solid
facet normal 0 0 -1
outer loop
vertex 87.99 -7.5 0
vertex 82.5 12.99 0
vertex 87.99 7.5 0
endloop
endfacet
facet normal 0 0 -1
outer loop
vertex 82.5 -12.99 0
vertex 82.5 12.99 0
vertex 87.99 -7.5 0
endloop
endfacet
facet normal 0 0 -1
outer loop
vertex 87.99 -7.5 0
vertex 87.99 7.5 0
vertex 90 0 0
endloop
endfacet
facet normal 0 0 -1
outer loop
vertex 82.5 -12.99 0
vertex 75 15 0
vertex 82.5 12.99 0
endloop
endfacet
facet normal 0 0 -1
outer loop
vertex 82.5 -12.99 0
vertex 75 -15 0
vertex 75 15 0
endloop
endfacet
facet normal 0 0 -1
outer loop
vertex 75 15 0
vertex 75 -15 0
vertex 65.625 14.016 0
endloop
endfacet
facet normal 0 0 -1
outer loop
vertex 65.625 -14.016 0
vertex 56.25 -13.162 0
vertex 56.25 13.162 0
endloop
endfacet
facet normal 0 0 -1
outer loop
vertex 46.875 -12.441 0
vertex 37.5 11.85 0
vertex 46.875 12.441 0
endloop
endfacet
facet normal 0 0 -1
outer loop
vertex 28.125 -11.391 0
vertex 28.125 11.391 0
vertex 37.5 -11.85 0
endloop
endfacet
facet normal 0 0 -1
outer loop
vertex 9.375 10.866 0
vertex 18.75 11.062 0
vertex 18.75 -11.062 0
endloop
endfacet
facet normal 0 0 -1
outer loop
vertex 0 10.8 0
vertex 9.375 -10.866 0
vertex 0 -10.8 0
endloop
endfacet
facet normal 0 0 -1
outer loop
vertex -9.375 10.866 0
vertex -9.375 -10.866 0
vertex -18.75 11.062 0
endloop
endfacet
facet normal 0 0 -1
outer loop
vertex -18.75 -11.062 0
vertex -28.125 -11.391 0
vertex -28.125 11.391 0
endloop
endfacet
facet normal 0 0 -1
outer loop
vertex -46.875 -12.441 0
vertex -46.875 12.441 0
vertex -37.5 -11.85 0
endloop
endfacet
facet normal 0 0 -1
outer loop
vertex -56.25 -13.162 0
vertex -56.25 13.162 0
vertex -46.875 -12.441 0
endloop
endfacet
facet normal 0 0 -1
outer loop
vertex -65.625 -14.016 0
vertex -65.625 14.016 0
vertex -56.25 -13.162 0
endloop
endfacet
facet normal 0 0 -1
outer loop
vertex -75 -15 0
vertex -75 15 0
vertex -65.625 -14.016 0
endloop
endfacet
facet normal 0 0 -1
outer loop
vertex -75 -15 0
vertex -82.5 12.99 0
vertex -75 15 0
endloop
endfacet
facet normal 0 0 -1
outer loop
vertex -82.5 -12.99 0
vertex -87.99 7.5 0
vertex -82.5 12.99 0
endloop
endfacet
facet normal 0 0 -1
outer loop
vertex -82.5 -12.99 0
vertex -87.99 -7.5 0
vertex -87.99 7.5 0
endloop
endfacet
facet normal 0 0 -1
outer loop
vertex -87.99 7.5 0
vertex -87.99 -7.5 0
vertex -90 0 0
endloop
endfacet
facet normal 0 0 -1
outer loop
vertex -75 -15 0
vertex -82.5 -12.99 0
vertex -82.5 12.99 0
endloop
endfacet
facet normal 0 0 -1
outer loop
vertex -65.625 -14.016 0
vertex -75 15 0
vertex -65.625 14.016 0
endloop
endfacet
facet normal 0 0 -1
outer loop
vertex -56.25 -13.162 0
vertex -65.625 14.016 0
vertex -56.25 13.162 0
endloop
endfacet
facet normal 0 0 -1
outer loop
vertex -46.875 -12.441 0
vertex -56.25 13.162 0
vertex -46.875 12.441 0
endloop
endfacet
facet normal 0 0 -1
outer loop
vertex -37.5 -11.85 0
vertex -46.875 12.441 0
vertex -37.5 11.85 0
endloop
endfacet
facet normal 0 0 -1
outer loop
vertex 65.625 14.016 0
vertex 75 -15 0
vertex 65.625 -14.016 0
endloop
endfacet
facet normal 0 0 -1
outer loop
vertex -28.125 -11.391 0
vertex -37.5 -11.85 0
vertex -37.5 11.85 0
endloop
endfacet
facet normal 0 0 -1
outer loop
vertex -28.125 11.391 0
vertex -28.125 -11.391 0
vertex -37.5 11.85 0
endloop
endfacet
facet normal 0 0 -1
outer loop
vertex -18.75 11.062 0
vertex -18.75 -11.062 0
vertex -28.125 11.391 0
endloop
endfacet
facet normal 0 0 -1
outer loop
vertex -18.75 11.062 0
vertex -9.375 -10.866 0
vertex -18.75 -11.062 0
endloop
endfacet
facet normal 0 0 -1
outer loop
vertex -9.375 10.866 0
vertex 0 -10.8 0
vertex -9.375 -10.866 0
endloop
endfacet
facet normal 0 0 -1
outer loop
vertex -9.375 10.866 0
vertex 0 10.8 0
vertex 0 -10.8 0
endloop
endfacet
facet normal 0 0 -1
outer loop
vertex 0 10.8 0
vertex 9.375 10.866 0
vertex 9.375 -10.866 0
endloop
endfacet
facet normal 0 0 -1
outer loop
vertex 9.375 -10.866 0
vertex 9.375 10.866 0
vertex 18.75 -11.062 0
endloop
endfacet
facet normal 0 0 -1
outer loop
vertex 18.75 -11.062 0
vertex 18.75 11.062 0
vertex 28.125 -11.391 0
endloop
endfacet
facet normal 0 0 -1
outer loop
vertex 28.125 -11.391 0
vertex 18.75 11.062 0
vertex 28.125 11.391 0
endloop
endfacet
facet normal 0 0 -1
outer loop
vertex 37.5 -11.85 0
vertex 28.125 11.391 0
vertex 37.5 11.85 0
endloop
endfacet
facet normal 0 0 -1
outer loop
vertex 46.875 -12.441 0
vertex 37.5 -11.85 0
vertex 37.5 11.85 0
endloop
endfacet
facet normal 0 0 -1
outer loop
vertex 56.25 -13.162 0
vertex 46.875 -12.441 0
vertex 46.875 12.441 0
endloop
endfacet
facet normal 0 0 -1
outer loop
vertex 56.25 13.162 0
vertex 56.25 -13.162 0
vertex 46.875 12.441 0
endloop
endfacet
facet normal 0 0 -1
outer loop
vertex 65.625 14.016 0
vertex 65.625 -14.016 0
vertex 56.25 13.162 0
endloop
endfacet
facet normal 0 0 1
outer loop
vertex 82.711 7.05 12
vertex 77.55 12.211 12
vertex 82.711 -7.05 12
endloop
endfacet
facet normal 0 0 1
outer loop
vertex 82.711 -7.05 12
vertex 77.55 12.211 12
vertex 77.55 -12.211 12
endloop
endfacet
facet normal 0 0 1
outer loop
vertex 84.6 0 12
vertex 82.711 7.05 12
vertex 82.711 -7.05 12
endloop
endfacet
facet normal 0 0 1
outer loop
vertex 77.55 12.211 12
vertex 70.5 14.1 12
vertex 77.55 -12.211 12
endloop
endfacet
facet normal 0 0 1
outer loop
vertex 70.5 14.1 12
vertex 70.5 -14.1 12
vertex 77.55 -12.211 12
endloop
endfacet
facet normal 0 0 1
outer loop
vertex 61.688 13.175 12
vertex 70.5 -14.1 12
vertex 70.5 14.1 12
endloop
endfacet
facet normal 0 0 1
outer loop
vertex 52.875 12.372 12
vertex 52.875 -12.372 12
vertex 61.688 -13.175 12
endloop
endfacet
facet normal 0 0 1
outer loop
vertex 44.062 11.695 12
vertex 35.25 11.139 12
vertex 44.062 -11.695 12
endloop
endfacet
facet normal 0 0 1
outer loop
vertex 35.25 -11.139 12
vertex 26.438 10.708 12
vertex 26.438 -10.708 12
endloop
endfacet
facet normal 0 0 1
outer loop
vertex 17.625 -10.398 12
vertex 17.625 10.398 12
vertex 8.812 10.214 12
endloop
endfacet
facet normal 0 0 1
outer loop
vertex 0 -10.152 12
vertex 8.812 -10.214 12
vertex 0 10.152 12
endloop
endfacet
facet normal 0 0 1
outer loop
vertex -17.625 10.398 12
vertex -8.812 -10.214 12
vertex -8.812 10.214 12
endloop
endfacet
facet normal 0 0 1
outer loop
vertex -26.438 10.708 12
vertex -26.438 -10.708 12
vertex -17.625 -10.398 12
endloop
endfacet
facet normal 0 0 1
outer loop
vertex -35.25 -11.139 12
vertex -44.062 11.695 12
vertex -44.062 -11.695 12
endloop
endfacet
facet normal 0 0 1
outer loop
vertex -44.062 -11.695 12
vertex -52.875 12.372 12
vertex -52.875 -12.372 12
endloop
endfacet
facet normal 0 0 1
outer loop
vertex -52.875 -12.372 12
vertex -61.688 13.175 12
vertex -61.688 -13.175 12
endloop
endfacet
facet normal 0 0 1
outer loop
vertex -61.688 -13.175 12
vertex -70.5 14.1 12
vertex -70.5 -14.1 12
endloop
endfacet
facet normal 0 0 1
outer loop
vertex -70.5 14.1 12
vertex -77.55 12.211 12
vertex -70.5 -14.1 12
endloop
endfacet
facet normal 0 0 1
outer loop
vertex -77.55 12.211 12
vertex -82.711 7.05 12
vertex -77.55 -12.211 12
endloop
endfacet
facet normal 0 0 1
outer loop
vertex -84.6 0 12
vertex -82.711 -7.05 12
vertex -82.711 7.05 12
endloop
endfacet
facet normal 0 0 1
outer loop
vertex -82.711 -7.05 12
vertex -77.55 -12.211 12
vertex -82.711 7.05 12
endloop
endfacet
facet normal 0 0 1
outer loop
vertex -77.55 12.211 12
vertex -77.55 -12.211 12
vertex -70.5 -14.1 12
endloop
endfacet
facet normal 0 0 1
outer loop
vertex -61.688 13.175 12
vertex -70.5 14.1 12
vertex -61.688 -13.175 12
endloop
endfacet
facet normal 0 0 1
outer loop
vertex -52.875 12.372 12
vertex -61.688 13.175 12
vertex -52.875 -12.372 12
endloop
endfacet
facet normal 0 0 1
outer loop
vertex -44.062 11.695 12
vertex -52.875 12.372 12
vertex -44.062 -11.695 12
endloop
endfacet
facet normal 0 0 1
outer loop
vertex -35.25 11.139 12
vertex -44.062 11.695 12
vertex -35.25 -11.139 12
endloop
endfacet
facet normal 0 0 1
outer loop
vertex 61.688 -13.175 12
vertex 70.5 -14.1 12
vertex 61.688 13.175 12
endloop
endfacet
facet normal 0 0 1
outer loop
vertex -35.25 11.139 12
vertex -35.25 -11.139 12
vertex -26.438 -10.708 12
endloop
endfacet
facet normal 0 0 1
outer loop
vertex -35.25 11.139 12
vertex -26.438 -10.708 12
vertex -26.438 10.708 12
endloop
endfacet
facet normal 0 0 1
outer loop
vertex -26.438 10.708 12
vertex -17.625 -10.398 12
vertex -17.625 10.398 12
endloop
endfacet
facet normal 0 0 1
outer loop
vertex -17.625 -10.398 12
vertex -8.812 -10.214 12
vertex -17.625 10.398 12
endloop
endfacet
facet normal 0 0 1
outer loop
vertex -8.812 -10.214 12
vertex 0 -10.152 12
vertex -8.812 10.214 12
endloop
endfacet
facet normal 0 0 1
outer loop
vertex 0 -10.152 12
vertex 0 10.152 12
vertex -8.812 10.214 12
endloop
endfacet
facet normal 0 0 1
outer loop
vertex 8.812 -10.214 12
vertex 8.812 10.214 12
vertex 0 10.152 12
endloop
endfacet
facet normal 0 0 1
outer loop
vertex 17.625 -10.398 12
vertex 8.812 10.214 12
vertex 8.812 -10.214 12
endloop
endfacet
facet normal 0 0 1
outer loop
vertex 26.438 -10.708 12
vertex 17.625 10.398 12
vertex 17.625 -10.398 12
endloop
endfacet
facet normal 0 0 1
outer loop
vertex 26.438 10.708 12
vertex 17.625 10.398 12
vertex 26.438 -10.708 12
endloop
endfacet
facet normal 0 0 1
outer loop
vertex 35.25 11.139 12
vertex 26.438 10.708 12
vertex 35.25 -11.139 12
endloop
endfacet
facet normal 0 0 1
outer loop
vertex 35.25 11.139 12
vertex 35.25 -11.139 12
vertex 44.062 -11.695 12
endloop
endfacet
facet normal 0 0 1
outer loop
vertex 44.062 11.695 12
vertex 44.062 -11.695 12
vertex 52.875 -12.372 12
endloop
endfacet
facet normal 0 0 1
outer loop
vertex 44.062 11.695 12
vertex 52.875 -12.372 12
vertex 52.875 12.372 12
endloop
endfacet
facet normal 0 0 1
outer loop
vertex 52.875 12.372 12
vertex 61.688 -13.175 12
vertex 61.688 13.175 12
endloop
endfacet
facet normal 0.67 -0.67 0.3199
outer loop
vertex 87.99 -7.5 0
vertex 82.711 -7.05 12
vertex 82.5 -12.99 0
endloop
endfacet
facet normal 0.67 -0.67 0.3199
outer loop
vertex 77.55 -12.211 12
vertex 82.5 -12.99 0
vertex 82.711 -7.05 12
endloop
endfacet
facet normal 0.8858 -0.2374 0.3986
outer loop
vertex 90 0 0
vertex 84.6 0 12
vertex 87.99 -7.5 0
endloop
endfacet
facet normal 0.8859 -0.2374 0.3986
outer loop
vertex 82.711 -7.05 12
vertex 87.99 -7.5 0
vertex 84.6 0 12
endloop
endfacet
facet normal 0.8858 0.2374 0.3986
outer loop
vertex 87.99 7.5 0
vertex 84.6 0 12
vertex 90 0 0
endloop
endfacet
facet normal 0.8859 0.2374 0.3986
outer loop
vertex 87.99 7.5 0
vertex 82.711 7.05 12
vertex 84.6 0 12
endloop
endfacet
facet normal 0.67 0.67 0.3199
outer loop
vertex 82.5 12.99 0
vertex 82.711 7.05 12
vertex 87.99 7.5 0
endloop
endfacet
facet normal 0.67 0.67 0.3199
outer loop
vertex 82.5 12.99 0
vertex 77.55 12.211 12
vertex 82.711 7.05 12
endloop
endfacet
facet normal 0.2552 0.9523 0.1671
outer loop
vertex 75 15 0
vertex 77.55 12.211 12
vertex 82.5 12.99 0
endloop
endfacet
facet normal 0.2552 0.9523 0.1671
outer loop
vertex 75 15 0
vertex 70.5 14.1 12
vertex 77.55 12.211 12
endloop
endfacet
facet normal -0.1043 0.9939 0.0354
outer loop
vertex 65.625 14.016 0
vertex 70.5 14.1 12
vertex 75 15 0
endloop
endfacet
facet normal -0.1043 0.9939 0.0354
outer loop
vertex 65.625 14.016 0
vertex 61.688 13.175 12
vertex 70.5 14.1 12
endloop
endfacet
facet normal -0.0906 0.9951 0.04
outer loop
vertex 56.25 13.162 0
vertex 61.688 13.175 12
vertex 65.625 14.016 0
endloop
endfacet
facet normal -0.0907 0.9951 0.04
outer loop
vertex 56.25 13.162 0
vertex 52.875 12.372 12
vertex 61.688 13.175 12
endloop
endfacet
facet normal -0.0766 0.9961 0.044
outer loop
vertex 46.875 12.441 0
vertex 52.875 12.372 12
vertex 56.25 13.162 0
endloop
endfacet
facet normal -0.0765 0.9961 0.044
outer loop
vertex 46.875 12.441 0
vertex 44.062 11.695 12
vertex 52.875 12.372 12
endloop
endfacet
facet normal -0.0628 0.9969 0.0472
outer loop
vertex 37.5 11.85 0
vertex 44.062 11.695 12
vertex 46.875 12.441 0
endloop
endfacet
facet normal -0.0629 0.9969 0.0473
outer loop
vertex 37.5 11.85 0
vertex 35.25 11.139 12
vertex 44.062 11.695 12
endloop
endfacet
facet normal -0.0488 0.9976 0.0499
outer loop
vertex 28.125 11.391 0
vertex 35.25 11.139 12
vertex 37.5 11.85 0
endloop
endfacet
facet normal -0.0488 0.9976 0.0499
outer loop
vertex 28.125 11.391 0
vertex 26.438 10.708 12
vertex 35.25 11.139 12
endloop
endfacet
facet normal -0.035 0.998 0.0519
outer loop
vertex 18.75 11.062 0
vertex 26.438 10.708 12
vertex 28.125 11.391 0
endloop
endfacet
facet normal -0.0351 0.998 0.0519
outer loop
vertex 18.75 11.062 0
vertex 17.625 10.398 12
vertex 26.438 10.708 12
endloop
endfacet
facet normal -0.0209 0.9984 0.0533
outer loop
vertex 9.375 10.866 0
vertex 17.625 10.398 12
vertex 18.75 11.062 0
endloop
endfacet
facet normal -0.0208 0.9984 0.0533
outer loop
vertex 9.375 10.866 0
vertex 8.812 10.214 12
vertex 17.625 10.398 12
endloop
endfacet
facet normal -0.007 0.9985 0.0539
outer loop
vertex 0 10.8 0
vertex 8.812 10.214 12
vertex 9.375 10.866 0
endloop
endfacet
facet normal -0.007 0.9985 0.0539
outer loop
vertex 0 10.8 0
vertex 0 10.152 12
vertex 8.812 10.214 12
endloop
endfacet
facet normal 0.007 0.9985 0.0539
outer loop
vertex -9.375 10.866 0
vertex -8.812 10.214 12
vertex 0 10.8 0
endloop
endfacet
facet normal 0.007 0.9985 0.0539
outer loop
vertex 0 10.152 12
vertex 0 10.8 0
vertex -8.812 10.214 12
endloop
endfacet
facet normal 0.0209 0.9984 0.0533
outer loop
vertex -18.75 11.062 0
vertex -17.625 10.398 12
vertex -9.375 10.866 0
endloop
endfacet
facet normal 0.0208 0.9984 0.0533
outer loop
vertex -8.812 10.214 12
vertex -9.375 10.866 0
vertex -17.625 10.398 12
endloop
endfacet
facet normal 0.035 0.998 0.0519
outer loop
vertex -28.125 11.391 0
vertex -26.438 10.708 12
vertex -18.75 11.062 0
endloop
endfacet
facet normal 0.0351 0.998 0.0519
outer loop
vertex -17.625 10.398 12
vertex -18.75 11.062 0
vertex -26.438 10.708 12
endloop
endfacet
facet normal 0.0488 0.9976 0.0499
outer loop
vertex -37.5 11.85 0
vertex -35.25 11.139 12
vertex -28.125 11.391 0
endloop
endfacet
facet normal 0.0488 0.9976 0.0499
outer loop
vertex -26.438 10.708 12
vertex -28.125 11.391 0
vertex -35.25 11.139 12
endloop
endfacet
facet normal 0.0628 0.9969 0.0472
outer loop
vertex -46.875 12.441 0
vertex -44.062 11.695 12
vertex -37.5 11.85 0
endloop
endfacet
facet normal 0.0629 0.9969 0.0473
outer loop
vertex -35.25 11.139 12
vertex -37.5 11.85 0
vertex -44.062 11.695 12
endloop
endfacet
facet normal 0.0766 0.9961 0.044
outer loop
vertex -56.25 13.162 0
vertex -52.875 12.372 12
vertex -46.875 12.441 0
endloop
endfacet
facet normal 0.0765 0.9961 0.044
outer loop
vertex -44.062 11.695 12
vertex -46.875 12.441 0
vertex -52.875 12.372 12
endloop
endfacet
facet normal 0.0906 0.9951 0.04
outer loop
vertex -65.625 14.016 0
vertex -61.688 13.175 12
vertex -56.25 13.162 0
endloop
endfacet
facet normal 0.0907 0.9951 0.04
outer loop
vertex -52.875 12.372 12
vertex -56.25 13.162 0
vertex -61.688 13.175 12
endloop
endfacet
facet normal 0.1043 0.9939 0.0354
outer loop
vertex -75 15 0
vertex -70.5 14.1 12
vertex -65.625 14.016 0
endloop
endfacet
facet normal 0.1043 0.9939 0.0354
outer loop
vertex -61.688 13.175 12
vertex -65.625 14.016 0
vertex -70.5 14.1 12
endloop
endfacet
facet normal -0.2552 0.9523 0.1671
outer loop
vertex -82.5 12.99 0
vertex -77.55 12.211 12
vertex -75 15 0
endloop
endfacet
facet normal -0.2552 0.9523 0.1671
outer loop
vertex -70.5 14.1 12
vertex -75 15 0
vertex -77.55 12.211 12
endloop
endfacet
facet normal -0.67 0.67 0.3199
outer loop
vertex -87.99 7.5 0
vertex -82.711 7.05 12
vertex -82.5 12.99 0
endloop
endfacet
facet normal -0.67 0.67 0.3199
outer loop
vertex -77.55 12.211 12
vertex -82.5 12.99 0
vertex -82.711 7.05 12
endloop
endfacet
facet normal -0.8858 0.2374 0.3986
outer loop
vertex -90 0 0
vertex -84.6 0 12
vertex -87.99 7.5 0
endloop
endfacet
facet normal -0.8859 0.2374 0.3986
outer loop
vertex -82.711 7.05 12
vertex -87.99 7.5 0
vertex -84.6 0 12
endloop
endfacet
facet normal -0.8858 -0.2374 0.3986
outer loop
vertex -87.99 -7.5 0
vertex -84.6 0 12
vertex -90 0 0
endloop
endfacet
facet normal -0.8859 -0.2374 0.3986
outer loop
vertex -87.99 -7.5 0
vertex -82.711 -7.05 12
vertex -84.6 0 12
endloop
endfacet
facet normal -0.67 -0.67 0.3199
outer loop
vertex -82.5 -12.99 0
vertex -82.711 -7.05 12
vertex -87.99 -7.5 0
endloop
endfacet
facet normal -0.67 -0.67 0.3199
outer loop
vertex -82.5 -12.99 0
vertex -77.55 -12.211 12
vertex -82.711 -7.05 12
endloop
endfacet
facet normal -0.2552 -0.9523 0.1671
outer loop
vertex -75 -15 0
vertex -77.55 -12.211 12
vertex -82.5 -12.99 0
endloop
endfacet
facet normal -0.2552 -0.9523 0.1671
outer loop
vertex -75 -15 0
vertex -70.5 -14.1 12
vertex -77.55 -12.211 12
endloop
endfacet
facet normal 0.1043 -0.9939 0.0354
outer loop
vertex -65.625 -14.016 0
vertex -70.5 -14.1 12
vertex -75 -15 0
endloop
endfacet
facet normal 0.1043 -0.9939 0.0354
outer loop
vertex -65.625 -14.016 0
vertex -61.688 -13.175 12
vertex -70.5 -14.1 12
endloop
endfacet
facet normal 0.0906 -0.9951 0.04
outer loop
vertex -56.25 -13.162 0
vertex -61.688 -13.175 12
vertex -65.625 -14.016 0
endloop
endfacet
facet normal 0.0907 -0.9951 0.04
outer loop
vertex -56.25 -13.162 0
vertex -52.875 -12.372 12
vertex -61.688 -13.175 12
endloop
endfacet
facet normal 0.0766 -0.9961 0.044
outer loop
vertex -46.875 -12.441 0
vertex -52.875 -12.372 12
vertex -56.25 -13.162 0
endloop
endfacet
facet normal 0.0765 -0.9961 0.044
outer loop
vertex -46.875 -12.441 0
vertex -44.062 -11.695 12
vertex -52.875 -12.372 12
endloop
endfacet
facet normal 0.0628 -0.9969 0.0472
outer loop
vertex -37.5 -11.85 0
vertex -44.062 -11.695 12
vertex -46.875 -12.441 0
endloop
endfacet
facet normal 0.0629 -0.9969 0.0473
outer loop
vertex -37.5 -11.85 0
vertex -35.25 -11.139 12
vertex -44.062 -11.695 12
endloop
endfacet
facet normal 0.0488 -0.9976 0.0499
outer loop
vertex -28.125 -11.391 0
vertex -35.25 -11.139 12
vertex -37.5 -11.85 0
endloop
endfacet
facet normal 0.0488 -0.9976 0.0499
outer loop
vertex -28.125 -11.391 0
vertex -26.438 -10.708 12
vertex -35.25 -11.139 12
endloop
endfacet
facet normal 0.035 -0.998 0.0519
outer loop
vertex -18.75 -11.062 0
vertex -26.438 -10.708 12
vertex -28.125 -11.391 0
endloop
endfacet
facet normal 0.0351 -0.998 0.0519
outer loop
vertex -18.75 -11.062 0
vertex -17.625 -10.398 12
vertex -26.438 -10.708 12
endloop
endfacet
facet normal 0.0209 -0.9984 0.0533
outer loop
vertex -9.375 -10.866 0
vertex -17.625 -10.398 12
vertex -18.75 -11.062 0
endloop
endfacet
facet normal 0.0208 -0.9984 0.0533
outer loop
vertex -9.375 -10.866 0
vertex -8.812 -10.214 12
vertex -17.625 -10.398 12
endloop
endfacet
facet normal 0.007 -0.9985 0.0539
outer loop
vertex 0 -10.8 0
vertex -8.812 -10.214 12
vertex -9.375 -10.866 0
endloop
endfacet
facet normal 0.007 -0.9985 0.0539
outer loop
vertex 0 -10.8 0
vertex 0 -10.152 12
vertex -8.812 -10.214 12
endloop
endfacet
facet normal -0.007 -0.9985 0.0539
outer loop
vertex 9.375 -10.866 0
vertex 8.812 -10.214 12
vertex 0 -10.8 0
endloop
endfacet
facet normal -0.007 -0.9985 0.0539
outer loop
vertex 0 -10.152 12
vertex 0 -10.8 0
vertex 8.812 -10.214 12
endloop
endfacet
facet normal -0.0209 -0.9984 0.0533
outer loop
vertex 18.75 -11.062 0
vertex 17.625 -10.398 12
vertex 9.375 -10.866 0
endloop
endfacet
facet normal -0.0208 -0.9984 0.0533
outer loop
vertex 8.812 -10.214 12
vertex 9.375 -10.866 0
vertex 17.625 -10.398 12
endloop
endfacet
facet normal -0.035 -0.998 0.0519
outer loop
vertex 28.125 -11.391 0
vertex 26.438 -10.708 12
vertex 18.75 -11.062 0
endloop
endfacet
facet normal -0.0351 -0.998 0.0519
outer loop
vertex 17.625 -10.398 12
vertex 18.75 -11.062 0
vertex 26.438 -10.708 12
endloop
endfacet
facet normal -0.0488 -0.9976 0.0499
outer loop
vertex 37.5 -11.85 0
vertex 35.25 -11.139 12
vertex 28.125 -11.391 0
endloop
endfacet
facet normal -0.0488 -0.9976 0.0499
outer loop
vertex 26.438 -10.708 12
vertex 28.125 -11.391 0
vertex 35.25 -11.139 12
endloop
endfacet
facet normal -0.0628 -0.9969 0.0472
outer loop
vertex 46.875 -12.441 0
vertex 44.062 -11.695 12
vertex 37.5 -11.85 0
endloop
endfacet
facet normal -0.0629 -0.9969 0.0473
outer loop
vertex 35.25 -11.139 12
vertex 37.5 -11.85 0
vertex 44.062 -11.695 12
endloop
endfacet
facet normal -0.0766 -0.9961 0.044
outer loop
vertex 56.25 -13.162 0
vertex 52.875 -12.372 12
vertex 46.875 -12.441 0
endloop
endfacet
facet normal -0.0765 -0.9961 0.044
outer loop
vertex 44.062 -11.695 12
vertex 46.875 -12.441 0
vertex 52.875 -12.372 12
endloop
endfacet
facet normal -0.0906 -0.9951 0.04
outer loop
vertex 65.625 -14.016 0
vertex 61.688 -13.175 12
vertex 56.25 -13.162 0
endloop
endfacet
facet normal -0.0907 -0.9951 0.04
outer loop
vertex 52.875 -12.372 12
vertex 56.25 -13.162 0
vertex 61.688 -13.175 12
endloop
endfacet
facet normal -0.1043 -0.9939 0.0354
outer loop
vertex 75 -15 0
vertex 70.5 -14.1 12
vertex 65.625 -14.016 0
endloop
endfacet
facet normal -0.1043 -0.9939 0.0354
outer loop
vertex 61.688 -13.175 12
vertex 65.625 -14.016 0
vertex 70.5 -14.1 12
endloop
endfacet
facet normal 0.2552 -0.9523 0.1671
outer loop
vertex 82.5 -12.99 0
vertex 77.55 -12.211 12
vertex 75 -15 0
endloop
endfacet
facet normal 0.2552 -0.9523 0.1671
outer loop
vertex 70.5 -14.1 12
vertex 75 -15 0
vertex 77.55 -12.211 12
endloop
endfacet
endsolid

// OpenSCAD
$fn = 32;

// ----------------------------------------------------------------------
// Handle: 180 x 30 mm grip, 12 mm thick
// ----------------------------------------------------------------------

// --- parameters (mm) ---
length = 180;             // grip length
width = 30;               // grip width
thickness = 12;           // grip thickness
waist = 0.72;             // width factor at the middle
draft = 0.94;             // top face scale of the extrusion

/* ergonomic grip outline, closed spline-like polygon in the XY plane */
grip = [[-75, 15], [-65.625, 14.016], [-56.25, 13.162], [-46.875, 12.441], [-37.5, 11.85], [-28.125, 11.391], [-18.75, 11.062], [-9.375, 10.866], [0, 10.8], [9.375, 10.866], [18.75, 11.062], [28.125, 11.391], [37.5, 11.85], [46.875, 12.441], [56.25, 13.162], [65.625, 14.016], [75, 15], [82.5, 12.99], [87.99, 7.5], [90, 0], [87.99, -7.5], [82.5, -12.99], [75, -15], [75, -15], [65.625, -14.016], [56.25, -13.162], [46.875, -12.441], [37.5, -11.85], [28.125, -11.391], [18.75, -11.062], [9.375, -10.866], [0, -10.8], [-9.375, -10.866], [-18.75, -11.062], [-28.125, -11.391], [-37.5, -11.85], [-46.875, -12.441], [-56.25, -13.162], [-65.625, -14.016], [-75, -15], [-82.5, -12.99], [-87.99, -7.5], [-90, 0], [-87.99, 7.5], [-82.5, 12.99], [-75, 15]];

module grip_body() {
  linear_extrude(height = thickness, scale = draft) polygon(grip);
}

difference() {
  union() {
    grip_body();
  }
}
